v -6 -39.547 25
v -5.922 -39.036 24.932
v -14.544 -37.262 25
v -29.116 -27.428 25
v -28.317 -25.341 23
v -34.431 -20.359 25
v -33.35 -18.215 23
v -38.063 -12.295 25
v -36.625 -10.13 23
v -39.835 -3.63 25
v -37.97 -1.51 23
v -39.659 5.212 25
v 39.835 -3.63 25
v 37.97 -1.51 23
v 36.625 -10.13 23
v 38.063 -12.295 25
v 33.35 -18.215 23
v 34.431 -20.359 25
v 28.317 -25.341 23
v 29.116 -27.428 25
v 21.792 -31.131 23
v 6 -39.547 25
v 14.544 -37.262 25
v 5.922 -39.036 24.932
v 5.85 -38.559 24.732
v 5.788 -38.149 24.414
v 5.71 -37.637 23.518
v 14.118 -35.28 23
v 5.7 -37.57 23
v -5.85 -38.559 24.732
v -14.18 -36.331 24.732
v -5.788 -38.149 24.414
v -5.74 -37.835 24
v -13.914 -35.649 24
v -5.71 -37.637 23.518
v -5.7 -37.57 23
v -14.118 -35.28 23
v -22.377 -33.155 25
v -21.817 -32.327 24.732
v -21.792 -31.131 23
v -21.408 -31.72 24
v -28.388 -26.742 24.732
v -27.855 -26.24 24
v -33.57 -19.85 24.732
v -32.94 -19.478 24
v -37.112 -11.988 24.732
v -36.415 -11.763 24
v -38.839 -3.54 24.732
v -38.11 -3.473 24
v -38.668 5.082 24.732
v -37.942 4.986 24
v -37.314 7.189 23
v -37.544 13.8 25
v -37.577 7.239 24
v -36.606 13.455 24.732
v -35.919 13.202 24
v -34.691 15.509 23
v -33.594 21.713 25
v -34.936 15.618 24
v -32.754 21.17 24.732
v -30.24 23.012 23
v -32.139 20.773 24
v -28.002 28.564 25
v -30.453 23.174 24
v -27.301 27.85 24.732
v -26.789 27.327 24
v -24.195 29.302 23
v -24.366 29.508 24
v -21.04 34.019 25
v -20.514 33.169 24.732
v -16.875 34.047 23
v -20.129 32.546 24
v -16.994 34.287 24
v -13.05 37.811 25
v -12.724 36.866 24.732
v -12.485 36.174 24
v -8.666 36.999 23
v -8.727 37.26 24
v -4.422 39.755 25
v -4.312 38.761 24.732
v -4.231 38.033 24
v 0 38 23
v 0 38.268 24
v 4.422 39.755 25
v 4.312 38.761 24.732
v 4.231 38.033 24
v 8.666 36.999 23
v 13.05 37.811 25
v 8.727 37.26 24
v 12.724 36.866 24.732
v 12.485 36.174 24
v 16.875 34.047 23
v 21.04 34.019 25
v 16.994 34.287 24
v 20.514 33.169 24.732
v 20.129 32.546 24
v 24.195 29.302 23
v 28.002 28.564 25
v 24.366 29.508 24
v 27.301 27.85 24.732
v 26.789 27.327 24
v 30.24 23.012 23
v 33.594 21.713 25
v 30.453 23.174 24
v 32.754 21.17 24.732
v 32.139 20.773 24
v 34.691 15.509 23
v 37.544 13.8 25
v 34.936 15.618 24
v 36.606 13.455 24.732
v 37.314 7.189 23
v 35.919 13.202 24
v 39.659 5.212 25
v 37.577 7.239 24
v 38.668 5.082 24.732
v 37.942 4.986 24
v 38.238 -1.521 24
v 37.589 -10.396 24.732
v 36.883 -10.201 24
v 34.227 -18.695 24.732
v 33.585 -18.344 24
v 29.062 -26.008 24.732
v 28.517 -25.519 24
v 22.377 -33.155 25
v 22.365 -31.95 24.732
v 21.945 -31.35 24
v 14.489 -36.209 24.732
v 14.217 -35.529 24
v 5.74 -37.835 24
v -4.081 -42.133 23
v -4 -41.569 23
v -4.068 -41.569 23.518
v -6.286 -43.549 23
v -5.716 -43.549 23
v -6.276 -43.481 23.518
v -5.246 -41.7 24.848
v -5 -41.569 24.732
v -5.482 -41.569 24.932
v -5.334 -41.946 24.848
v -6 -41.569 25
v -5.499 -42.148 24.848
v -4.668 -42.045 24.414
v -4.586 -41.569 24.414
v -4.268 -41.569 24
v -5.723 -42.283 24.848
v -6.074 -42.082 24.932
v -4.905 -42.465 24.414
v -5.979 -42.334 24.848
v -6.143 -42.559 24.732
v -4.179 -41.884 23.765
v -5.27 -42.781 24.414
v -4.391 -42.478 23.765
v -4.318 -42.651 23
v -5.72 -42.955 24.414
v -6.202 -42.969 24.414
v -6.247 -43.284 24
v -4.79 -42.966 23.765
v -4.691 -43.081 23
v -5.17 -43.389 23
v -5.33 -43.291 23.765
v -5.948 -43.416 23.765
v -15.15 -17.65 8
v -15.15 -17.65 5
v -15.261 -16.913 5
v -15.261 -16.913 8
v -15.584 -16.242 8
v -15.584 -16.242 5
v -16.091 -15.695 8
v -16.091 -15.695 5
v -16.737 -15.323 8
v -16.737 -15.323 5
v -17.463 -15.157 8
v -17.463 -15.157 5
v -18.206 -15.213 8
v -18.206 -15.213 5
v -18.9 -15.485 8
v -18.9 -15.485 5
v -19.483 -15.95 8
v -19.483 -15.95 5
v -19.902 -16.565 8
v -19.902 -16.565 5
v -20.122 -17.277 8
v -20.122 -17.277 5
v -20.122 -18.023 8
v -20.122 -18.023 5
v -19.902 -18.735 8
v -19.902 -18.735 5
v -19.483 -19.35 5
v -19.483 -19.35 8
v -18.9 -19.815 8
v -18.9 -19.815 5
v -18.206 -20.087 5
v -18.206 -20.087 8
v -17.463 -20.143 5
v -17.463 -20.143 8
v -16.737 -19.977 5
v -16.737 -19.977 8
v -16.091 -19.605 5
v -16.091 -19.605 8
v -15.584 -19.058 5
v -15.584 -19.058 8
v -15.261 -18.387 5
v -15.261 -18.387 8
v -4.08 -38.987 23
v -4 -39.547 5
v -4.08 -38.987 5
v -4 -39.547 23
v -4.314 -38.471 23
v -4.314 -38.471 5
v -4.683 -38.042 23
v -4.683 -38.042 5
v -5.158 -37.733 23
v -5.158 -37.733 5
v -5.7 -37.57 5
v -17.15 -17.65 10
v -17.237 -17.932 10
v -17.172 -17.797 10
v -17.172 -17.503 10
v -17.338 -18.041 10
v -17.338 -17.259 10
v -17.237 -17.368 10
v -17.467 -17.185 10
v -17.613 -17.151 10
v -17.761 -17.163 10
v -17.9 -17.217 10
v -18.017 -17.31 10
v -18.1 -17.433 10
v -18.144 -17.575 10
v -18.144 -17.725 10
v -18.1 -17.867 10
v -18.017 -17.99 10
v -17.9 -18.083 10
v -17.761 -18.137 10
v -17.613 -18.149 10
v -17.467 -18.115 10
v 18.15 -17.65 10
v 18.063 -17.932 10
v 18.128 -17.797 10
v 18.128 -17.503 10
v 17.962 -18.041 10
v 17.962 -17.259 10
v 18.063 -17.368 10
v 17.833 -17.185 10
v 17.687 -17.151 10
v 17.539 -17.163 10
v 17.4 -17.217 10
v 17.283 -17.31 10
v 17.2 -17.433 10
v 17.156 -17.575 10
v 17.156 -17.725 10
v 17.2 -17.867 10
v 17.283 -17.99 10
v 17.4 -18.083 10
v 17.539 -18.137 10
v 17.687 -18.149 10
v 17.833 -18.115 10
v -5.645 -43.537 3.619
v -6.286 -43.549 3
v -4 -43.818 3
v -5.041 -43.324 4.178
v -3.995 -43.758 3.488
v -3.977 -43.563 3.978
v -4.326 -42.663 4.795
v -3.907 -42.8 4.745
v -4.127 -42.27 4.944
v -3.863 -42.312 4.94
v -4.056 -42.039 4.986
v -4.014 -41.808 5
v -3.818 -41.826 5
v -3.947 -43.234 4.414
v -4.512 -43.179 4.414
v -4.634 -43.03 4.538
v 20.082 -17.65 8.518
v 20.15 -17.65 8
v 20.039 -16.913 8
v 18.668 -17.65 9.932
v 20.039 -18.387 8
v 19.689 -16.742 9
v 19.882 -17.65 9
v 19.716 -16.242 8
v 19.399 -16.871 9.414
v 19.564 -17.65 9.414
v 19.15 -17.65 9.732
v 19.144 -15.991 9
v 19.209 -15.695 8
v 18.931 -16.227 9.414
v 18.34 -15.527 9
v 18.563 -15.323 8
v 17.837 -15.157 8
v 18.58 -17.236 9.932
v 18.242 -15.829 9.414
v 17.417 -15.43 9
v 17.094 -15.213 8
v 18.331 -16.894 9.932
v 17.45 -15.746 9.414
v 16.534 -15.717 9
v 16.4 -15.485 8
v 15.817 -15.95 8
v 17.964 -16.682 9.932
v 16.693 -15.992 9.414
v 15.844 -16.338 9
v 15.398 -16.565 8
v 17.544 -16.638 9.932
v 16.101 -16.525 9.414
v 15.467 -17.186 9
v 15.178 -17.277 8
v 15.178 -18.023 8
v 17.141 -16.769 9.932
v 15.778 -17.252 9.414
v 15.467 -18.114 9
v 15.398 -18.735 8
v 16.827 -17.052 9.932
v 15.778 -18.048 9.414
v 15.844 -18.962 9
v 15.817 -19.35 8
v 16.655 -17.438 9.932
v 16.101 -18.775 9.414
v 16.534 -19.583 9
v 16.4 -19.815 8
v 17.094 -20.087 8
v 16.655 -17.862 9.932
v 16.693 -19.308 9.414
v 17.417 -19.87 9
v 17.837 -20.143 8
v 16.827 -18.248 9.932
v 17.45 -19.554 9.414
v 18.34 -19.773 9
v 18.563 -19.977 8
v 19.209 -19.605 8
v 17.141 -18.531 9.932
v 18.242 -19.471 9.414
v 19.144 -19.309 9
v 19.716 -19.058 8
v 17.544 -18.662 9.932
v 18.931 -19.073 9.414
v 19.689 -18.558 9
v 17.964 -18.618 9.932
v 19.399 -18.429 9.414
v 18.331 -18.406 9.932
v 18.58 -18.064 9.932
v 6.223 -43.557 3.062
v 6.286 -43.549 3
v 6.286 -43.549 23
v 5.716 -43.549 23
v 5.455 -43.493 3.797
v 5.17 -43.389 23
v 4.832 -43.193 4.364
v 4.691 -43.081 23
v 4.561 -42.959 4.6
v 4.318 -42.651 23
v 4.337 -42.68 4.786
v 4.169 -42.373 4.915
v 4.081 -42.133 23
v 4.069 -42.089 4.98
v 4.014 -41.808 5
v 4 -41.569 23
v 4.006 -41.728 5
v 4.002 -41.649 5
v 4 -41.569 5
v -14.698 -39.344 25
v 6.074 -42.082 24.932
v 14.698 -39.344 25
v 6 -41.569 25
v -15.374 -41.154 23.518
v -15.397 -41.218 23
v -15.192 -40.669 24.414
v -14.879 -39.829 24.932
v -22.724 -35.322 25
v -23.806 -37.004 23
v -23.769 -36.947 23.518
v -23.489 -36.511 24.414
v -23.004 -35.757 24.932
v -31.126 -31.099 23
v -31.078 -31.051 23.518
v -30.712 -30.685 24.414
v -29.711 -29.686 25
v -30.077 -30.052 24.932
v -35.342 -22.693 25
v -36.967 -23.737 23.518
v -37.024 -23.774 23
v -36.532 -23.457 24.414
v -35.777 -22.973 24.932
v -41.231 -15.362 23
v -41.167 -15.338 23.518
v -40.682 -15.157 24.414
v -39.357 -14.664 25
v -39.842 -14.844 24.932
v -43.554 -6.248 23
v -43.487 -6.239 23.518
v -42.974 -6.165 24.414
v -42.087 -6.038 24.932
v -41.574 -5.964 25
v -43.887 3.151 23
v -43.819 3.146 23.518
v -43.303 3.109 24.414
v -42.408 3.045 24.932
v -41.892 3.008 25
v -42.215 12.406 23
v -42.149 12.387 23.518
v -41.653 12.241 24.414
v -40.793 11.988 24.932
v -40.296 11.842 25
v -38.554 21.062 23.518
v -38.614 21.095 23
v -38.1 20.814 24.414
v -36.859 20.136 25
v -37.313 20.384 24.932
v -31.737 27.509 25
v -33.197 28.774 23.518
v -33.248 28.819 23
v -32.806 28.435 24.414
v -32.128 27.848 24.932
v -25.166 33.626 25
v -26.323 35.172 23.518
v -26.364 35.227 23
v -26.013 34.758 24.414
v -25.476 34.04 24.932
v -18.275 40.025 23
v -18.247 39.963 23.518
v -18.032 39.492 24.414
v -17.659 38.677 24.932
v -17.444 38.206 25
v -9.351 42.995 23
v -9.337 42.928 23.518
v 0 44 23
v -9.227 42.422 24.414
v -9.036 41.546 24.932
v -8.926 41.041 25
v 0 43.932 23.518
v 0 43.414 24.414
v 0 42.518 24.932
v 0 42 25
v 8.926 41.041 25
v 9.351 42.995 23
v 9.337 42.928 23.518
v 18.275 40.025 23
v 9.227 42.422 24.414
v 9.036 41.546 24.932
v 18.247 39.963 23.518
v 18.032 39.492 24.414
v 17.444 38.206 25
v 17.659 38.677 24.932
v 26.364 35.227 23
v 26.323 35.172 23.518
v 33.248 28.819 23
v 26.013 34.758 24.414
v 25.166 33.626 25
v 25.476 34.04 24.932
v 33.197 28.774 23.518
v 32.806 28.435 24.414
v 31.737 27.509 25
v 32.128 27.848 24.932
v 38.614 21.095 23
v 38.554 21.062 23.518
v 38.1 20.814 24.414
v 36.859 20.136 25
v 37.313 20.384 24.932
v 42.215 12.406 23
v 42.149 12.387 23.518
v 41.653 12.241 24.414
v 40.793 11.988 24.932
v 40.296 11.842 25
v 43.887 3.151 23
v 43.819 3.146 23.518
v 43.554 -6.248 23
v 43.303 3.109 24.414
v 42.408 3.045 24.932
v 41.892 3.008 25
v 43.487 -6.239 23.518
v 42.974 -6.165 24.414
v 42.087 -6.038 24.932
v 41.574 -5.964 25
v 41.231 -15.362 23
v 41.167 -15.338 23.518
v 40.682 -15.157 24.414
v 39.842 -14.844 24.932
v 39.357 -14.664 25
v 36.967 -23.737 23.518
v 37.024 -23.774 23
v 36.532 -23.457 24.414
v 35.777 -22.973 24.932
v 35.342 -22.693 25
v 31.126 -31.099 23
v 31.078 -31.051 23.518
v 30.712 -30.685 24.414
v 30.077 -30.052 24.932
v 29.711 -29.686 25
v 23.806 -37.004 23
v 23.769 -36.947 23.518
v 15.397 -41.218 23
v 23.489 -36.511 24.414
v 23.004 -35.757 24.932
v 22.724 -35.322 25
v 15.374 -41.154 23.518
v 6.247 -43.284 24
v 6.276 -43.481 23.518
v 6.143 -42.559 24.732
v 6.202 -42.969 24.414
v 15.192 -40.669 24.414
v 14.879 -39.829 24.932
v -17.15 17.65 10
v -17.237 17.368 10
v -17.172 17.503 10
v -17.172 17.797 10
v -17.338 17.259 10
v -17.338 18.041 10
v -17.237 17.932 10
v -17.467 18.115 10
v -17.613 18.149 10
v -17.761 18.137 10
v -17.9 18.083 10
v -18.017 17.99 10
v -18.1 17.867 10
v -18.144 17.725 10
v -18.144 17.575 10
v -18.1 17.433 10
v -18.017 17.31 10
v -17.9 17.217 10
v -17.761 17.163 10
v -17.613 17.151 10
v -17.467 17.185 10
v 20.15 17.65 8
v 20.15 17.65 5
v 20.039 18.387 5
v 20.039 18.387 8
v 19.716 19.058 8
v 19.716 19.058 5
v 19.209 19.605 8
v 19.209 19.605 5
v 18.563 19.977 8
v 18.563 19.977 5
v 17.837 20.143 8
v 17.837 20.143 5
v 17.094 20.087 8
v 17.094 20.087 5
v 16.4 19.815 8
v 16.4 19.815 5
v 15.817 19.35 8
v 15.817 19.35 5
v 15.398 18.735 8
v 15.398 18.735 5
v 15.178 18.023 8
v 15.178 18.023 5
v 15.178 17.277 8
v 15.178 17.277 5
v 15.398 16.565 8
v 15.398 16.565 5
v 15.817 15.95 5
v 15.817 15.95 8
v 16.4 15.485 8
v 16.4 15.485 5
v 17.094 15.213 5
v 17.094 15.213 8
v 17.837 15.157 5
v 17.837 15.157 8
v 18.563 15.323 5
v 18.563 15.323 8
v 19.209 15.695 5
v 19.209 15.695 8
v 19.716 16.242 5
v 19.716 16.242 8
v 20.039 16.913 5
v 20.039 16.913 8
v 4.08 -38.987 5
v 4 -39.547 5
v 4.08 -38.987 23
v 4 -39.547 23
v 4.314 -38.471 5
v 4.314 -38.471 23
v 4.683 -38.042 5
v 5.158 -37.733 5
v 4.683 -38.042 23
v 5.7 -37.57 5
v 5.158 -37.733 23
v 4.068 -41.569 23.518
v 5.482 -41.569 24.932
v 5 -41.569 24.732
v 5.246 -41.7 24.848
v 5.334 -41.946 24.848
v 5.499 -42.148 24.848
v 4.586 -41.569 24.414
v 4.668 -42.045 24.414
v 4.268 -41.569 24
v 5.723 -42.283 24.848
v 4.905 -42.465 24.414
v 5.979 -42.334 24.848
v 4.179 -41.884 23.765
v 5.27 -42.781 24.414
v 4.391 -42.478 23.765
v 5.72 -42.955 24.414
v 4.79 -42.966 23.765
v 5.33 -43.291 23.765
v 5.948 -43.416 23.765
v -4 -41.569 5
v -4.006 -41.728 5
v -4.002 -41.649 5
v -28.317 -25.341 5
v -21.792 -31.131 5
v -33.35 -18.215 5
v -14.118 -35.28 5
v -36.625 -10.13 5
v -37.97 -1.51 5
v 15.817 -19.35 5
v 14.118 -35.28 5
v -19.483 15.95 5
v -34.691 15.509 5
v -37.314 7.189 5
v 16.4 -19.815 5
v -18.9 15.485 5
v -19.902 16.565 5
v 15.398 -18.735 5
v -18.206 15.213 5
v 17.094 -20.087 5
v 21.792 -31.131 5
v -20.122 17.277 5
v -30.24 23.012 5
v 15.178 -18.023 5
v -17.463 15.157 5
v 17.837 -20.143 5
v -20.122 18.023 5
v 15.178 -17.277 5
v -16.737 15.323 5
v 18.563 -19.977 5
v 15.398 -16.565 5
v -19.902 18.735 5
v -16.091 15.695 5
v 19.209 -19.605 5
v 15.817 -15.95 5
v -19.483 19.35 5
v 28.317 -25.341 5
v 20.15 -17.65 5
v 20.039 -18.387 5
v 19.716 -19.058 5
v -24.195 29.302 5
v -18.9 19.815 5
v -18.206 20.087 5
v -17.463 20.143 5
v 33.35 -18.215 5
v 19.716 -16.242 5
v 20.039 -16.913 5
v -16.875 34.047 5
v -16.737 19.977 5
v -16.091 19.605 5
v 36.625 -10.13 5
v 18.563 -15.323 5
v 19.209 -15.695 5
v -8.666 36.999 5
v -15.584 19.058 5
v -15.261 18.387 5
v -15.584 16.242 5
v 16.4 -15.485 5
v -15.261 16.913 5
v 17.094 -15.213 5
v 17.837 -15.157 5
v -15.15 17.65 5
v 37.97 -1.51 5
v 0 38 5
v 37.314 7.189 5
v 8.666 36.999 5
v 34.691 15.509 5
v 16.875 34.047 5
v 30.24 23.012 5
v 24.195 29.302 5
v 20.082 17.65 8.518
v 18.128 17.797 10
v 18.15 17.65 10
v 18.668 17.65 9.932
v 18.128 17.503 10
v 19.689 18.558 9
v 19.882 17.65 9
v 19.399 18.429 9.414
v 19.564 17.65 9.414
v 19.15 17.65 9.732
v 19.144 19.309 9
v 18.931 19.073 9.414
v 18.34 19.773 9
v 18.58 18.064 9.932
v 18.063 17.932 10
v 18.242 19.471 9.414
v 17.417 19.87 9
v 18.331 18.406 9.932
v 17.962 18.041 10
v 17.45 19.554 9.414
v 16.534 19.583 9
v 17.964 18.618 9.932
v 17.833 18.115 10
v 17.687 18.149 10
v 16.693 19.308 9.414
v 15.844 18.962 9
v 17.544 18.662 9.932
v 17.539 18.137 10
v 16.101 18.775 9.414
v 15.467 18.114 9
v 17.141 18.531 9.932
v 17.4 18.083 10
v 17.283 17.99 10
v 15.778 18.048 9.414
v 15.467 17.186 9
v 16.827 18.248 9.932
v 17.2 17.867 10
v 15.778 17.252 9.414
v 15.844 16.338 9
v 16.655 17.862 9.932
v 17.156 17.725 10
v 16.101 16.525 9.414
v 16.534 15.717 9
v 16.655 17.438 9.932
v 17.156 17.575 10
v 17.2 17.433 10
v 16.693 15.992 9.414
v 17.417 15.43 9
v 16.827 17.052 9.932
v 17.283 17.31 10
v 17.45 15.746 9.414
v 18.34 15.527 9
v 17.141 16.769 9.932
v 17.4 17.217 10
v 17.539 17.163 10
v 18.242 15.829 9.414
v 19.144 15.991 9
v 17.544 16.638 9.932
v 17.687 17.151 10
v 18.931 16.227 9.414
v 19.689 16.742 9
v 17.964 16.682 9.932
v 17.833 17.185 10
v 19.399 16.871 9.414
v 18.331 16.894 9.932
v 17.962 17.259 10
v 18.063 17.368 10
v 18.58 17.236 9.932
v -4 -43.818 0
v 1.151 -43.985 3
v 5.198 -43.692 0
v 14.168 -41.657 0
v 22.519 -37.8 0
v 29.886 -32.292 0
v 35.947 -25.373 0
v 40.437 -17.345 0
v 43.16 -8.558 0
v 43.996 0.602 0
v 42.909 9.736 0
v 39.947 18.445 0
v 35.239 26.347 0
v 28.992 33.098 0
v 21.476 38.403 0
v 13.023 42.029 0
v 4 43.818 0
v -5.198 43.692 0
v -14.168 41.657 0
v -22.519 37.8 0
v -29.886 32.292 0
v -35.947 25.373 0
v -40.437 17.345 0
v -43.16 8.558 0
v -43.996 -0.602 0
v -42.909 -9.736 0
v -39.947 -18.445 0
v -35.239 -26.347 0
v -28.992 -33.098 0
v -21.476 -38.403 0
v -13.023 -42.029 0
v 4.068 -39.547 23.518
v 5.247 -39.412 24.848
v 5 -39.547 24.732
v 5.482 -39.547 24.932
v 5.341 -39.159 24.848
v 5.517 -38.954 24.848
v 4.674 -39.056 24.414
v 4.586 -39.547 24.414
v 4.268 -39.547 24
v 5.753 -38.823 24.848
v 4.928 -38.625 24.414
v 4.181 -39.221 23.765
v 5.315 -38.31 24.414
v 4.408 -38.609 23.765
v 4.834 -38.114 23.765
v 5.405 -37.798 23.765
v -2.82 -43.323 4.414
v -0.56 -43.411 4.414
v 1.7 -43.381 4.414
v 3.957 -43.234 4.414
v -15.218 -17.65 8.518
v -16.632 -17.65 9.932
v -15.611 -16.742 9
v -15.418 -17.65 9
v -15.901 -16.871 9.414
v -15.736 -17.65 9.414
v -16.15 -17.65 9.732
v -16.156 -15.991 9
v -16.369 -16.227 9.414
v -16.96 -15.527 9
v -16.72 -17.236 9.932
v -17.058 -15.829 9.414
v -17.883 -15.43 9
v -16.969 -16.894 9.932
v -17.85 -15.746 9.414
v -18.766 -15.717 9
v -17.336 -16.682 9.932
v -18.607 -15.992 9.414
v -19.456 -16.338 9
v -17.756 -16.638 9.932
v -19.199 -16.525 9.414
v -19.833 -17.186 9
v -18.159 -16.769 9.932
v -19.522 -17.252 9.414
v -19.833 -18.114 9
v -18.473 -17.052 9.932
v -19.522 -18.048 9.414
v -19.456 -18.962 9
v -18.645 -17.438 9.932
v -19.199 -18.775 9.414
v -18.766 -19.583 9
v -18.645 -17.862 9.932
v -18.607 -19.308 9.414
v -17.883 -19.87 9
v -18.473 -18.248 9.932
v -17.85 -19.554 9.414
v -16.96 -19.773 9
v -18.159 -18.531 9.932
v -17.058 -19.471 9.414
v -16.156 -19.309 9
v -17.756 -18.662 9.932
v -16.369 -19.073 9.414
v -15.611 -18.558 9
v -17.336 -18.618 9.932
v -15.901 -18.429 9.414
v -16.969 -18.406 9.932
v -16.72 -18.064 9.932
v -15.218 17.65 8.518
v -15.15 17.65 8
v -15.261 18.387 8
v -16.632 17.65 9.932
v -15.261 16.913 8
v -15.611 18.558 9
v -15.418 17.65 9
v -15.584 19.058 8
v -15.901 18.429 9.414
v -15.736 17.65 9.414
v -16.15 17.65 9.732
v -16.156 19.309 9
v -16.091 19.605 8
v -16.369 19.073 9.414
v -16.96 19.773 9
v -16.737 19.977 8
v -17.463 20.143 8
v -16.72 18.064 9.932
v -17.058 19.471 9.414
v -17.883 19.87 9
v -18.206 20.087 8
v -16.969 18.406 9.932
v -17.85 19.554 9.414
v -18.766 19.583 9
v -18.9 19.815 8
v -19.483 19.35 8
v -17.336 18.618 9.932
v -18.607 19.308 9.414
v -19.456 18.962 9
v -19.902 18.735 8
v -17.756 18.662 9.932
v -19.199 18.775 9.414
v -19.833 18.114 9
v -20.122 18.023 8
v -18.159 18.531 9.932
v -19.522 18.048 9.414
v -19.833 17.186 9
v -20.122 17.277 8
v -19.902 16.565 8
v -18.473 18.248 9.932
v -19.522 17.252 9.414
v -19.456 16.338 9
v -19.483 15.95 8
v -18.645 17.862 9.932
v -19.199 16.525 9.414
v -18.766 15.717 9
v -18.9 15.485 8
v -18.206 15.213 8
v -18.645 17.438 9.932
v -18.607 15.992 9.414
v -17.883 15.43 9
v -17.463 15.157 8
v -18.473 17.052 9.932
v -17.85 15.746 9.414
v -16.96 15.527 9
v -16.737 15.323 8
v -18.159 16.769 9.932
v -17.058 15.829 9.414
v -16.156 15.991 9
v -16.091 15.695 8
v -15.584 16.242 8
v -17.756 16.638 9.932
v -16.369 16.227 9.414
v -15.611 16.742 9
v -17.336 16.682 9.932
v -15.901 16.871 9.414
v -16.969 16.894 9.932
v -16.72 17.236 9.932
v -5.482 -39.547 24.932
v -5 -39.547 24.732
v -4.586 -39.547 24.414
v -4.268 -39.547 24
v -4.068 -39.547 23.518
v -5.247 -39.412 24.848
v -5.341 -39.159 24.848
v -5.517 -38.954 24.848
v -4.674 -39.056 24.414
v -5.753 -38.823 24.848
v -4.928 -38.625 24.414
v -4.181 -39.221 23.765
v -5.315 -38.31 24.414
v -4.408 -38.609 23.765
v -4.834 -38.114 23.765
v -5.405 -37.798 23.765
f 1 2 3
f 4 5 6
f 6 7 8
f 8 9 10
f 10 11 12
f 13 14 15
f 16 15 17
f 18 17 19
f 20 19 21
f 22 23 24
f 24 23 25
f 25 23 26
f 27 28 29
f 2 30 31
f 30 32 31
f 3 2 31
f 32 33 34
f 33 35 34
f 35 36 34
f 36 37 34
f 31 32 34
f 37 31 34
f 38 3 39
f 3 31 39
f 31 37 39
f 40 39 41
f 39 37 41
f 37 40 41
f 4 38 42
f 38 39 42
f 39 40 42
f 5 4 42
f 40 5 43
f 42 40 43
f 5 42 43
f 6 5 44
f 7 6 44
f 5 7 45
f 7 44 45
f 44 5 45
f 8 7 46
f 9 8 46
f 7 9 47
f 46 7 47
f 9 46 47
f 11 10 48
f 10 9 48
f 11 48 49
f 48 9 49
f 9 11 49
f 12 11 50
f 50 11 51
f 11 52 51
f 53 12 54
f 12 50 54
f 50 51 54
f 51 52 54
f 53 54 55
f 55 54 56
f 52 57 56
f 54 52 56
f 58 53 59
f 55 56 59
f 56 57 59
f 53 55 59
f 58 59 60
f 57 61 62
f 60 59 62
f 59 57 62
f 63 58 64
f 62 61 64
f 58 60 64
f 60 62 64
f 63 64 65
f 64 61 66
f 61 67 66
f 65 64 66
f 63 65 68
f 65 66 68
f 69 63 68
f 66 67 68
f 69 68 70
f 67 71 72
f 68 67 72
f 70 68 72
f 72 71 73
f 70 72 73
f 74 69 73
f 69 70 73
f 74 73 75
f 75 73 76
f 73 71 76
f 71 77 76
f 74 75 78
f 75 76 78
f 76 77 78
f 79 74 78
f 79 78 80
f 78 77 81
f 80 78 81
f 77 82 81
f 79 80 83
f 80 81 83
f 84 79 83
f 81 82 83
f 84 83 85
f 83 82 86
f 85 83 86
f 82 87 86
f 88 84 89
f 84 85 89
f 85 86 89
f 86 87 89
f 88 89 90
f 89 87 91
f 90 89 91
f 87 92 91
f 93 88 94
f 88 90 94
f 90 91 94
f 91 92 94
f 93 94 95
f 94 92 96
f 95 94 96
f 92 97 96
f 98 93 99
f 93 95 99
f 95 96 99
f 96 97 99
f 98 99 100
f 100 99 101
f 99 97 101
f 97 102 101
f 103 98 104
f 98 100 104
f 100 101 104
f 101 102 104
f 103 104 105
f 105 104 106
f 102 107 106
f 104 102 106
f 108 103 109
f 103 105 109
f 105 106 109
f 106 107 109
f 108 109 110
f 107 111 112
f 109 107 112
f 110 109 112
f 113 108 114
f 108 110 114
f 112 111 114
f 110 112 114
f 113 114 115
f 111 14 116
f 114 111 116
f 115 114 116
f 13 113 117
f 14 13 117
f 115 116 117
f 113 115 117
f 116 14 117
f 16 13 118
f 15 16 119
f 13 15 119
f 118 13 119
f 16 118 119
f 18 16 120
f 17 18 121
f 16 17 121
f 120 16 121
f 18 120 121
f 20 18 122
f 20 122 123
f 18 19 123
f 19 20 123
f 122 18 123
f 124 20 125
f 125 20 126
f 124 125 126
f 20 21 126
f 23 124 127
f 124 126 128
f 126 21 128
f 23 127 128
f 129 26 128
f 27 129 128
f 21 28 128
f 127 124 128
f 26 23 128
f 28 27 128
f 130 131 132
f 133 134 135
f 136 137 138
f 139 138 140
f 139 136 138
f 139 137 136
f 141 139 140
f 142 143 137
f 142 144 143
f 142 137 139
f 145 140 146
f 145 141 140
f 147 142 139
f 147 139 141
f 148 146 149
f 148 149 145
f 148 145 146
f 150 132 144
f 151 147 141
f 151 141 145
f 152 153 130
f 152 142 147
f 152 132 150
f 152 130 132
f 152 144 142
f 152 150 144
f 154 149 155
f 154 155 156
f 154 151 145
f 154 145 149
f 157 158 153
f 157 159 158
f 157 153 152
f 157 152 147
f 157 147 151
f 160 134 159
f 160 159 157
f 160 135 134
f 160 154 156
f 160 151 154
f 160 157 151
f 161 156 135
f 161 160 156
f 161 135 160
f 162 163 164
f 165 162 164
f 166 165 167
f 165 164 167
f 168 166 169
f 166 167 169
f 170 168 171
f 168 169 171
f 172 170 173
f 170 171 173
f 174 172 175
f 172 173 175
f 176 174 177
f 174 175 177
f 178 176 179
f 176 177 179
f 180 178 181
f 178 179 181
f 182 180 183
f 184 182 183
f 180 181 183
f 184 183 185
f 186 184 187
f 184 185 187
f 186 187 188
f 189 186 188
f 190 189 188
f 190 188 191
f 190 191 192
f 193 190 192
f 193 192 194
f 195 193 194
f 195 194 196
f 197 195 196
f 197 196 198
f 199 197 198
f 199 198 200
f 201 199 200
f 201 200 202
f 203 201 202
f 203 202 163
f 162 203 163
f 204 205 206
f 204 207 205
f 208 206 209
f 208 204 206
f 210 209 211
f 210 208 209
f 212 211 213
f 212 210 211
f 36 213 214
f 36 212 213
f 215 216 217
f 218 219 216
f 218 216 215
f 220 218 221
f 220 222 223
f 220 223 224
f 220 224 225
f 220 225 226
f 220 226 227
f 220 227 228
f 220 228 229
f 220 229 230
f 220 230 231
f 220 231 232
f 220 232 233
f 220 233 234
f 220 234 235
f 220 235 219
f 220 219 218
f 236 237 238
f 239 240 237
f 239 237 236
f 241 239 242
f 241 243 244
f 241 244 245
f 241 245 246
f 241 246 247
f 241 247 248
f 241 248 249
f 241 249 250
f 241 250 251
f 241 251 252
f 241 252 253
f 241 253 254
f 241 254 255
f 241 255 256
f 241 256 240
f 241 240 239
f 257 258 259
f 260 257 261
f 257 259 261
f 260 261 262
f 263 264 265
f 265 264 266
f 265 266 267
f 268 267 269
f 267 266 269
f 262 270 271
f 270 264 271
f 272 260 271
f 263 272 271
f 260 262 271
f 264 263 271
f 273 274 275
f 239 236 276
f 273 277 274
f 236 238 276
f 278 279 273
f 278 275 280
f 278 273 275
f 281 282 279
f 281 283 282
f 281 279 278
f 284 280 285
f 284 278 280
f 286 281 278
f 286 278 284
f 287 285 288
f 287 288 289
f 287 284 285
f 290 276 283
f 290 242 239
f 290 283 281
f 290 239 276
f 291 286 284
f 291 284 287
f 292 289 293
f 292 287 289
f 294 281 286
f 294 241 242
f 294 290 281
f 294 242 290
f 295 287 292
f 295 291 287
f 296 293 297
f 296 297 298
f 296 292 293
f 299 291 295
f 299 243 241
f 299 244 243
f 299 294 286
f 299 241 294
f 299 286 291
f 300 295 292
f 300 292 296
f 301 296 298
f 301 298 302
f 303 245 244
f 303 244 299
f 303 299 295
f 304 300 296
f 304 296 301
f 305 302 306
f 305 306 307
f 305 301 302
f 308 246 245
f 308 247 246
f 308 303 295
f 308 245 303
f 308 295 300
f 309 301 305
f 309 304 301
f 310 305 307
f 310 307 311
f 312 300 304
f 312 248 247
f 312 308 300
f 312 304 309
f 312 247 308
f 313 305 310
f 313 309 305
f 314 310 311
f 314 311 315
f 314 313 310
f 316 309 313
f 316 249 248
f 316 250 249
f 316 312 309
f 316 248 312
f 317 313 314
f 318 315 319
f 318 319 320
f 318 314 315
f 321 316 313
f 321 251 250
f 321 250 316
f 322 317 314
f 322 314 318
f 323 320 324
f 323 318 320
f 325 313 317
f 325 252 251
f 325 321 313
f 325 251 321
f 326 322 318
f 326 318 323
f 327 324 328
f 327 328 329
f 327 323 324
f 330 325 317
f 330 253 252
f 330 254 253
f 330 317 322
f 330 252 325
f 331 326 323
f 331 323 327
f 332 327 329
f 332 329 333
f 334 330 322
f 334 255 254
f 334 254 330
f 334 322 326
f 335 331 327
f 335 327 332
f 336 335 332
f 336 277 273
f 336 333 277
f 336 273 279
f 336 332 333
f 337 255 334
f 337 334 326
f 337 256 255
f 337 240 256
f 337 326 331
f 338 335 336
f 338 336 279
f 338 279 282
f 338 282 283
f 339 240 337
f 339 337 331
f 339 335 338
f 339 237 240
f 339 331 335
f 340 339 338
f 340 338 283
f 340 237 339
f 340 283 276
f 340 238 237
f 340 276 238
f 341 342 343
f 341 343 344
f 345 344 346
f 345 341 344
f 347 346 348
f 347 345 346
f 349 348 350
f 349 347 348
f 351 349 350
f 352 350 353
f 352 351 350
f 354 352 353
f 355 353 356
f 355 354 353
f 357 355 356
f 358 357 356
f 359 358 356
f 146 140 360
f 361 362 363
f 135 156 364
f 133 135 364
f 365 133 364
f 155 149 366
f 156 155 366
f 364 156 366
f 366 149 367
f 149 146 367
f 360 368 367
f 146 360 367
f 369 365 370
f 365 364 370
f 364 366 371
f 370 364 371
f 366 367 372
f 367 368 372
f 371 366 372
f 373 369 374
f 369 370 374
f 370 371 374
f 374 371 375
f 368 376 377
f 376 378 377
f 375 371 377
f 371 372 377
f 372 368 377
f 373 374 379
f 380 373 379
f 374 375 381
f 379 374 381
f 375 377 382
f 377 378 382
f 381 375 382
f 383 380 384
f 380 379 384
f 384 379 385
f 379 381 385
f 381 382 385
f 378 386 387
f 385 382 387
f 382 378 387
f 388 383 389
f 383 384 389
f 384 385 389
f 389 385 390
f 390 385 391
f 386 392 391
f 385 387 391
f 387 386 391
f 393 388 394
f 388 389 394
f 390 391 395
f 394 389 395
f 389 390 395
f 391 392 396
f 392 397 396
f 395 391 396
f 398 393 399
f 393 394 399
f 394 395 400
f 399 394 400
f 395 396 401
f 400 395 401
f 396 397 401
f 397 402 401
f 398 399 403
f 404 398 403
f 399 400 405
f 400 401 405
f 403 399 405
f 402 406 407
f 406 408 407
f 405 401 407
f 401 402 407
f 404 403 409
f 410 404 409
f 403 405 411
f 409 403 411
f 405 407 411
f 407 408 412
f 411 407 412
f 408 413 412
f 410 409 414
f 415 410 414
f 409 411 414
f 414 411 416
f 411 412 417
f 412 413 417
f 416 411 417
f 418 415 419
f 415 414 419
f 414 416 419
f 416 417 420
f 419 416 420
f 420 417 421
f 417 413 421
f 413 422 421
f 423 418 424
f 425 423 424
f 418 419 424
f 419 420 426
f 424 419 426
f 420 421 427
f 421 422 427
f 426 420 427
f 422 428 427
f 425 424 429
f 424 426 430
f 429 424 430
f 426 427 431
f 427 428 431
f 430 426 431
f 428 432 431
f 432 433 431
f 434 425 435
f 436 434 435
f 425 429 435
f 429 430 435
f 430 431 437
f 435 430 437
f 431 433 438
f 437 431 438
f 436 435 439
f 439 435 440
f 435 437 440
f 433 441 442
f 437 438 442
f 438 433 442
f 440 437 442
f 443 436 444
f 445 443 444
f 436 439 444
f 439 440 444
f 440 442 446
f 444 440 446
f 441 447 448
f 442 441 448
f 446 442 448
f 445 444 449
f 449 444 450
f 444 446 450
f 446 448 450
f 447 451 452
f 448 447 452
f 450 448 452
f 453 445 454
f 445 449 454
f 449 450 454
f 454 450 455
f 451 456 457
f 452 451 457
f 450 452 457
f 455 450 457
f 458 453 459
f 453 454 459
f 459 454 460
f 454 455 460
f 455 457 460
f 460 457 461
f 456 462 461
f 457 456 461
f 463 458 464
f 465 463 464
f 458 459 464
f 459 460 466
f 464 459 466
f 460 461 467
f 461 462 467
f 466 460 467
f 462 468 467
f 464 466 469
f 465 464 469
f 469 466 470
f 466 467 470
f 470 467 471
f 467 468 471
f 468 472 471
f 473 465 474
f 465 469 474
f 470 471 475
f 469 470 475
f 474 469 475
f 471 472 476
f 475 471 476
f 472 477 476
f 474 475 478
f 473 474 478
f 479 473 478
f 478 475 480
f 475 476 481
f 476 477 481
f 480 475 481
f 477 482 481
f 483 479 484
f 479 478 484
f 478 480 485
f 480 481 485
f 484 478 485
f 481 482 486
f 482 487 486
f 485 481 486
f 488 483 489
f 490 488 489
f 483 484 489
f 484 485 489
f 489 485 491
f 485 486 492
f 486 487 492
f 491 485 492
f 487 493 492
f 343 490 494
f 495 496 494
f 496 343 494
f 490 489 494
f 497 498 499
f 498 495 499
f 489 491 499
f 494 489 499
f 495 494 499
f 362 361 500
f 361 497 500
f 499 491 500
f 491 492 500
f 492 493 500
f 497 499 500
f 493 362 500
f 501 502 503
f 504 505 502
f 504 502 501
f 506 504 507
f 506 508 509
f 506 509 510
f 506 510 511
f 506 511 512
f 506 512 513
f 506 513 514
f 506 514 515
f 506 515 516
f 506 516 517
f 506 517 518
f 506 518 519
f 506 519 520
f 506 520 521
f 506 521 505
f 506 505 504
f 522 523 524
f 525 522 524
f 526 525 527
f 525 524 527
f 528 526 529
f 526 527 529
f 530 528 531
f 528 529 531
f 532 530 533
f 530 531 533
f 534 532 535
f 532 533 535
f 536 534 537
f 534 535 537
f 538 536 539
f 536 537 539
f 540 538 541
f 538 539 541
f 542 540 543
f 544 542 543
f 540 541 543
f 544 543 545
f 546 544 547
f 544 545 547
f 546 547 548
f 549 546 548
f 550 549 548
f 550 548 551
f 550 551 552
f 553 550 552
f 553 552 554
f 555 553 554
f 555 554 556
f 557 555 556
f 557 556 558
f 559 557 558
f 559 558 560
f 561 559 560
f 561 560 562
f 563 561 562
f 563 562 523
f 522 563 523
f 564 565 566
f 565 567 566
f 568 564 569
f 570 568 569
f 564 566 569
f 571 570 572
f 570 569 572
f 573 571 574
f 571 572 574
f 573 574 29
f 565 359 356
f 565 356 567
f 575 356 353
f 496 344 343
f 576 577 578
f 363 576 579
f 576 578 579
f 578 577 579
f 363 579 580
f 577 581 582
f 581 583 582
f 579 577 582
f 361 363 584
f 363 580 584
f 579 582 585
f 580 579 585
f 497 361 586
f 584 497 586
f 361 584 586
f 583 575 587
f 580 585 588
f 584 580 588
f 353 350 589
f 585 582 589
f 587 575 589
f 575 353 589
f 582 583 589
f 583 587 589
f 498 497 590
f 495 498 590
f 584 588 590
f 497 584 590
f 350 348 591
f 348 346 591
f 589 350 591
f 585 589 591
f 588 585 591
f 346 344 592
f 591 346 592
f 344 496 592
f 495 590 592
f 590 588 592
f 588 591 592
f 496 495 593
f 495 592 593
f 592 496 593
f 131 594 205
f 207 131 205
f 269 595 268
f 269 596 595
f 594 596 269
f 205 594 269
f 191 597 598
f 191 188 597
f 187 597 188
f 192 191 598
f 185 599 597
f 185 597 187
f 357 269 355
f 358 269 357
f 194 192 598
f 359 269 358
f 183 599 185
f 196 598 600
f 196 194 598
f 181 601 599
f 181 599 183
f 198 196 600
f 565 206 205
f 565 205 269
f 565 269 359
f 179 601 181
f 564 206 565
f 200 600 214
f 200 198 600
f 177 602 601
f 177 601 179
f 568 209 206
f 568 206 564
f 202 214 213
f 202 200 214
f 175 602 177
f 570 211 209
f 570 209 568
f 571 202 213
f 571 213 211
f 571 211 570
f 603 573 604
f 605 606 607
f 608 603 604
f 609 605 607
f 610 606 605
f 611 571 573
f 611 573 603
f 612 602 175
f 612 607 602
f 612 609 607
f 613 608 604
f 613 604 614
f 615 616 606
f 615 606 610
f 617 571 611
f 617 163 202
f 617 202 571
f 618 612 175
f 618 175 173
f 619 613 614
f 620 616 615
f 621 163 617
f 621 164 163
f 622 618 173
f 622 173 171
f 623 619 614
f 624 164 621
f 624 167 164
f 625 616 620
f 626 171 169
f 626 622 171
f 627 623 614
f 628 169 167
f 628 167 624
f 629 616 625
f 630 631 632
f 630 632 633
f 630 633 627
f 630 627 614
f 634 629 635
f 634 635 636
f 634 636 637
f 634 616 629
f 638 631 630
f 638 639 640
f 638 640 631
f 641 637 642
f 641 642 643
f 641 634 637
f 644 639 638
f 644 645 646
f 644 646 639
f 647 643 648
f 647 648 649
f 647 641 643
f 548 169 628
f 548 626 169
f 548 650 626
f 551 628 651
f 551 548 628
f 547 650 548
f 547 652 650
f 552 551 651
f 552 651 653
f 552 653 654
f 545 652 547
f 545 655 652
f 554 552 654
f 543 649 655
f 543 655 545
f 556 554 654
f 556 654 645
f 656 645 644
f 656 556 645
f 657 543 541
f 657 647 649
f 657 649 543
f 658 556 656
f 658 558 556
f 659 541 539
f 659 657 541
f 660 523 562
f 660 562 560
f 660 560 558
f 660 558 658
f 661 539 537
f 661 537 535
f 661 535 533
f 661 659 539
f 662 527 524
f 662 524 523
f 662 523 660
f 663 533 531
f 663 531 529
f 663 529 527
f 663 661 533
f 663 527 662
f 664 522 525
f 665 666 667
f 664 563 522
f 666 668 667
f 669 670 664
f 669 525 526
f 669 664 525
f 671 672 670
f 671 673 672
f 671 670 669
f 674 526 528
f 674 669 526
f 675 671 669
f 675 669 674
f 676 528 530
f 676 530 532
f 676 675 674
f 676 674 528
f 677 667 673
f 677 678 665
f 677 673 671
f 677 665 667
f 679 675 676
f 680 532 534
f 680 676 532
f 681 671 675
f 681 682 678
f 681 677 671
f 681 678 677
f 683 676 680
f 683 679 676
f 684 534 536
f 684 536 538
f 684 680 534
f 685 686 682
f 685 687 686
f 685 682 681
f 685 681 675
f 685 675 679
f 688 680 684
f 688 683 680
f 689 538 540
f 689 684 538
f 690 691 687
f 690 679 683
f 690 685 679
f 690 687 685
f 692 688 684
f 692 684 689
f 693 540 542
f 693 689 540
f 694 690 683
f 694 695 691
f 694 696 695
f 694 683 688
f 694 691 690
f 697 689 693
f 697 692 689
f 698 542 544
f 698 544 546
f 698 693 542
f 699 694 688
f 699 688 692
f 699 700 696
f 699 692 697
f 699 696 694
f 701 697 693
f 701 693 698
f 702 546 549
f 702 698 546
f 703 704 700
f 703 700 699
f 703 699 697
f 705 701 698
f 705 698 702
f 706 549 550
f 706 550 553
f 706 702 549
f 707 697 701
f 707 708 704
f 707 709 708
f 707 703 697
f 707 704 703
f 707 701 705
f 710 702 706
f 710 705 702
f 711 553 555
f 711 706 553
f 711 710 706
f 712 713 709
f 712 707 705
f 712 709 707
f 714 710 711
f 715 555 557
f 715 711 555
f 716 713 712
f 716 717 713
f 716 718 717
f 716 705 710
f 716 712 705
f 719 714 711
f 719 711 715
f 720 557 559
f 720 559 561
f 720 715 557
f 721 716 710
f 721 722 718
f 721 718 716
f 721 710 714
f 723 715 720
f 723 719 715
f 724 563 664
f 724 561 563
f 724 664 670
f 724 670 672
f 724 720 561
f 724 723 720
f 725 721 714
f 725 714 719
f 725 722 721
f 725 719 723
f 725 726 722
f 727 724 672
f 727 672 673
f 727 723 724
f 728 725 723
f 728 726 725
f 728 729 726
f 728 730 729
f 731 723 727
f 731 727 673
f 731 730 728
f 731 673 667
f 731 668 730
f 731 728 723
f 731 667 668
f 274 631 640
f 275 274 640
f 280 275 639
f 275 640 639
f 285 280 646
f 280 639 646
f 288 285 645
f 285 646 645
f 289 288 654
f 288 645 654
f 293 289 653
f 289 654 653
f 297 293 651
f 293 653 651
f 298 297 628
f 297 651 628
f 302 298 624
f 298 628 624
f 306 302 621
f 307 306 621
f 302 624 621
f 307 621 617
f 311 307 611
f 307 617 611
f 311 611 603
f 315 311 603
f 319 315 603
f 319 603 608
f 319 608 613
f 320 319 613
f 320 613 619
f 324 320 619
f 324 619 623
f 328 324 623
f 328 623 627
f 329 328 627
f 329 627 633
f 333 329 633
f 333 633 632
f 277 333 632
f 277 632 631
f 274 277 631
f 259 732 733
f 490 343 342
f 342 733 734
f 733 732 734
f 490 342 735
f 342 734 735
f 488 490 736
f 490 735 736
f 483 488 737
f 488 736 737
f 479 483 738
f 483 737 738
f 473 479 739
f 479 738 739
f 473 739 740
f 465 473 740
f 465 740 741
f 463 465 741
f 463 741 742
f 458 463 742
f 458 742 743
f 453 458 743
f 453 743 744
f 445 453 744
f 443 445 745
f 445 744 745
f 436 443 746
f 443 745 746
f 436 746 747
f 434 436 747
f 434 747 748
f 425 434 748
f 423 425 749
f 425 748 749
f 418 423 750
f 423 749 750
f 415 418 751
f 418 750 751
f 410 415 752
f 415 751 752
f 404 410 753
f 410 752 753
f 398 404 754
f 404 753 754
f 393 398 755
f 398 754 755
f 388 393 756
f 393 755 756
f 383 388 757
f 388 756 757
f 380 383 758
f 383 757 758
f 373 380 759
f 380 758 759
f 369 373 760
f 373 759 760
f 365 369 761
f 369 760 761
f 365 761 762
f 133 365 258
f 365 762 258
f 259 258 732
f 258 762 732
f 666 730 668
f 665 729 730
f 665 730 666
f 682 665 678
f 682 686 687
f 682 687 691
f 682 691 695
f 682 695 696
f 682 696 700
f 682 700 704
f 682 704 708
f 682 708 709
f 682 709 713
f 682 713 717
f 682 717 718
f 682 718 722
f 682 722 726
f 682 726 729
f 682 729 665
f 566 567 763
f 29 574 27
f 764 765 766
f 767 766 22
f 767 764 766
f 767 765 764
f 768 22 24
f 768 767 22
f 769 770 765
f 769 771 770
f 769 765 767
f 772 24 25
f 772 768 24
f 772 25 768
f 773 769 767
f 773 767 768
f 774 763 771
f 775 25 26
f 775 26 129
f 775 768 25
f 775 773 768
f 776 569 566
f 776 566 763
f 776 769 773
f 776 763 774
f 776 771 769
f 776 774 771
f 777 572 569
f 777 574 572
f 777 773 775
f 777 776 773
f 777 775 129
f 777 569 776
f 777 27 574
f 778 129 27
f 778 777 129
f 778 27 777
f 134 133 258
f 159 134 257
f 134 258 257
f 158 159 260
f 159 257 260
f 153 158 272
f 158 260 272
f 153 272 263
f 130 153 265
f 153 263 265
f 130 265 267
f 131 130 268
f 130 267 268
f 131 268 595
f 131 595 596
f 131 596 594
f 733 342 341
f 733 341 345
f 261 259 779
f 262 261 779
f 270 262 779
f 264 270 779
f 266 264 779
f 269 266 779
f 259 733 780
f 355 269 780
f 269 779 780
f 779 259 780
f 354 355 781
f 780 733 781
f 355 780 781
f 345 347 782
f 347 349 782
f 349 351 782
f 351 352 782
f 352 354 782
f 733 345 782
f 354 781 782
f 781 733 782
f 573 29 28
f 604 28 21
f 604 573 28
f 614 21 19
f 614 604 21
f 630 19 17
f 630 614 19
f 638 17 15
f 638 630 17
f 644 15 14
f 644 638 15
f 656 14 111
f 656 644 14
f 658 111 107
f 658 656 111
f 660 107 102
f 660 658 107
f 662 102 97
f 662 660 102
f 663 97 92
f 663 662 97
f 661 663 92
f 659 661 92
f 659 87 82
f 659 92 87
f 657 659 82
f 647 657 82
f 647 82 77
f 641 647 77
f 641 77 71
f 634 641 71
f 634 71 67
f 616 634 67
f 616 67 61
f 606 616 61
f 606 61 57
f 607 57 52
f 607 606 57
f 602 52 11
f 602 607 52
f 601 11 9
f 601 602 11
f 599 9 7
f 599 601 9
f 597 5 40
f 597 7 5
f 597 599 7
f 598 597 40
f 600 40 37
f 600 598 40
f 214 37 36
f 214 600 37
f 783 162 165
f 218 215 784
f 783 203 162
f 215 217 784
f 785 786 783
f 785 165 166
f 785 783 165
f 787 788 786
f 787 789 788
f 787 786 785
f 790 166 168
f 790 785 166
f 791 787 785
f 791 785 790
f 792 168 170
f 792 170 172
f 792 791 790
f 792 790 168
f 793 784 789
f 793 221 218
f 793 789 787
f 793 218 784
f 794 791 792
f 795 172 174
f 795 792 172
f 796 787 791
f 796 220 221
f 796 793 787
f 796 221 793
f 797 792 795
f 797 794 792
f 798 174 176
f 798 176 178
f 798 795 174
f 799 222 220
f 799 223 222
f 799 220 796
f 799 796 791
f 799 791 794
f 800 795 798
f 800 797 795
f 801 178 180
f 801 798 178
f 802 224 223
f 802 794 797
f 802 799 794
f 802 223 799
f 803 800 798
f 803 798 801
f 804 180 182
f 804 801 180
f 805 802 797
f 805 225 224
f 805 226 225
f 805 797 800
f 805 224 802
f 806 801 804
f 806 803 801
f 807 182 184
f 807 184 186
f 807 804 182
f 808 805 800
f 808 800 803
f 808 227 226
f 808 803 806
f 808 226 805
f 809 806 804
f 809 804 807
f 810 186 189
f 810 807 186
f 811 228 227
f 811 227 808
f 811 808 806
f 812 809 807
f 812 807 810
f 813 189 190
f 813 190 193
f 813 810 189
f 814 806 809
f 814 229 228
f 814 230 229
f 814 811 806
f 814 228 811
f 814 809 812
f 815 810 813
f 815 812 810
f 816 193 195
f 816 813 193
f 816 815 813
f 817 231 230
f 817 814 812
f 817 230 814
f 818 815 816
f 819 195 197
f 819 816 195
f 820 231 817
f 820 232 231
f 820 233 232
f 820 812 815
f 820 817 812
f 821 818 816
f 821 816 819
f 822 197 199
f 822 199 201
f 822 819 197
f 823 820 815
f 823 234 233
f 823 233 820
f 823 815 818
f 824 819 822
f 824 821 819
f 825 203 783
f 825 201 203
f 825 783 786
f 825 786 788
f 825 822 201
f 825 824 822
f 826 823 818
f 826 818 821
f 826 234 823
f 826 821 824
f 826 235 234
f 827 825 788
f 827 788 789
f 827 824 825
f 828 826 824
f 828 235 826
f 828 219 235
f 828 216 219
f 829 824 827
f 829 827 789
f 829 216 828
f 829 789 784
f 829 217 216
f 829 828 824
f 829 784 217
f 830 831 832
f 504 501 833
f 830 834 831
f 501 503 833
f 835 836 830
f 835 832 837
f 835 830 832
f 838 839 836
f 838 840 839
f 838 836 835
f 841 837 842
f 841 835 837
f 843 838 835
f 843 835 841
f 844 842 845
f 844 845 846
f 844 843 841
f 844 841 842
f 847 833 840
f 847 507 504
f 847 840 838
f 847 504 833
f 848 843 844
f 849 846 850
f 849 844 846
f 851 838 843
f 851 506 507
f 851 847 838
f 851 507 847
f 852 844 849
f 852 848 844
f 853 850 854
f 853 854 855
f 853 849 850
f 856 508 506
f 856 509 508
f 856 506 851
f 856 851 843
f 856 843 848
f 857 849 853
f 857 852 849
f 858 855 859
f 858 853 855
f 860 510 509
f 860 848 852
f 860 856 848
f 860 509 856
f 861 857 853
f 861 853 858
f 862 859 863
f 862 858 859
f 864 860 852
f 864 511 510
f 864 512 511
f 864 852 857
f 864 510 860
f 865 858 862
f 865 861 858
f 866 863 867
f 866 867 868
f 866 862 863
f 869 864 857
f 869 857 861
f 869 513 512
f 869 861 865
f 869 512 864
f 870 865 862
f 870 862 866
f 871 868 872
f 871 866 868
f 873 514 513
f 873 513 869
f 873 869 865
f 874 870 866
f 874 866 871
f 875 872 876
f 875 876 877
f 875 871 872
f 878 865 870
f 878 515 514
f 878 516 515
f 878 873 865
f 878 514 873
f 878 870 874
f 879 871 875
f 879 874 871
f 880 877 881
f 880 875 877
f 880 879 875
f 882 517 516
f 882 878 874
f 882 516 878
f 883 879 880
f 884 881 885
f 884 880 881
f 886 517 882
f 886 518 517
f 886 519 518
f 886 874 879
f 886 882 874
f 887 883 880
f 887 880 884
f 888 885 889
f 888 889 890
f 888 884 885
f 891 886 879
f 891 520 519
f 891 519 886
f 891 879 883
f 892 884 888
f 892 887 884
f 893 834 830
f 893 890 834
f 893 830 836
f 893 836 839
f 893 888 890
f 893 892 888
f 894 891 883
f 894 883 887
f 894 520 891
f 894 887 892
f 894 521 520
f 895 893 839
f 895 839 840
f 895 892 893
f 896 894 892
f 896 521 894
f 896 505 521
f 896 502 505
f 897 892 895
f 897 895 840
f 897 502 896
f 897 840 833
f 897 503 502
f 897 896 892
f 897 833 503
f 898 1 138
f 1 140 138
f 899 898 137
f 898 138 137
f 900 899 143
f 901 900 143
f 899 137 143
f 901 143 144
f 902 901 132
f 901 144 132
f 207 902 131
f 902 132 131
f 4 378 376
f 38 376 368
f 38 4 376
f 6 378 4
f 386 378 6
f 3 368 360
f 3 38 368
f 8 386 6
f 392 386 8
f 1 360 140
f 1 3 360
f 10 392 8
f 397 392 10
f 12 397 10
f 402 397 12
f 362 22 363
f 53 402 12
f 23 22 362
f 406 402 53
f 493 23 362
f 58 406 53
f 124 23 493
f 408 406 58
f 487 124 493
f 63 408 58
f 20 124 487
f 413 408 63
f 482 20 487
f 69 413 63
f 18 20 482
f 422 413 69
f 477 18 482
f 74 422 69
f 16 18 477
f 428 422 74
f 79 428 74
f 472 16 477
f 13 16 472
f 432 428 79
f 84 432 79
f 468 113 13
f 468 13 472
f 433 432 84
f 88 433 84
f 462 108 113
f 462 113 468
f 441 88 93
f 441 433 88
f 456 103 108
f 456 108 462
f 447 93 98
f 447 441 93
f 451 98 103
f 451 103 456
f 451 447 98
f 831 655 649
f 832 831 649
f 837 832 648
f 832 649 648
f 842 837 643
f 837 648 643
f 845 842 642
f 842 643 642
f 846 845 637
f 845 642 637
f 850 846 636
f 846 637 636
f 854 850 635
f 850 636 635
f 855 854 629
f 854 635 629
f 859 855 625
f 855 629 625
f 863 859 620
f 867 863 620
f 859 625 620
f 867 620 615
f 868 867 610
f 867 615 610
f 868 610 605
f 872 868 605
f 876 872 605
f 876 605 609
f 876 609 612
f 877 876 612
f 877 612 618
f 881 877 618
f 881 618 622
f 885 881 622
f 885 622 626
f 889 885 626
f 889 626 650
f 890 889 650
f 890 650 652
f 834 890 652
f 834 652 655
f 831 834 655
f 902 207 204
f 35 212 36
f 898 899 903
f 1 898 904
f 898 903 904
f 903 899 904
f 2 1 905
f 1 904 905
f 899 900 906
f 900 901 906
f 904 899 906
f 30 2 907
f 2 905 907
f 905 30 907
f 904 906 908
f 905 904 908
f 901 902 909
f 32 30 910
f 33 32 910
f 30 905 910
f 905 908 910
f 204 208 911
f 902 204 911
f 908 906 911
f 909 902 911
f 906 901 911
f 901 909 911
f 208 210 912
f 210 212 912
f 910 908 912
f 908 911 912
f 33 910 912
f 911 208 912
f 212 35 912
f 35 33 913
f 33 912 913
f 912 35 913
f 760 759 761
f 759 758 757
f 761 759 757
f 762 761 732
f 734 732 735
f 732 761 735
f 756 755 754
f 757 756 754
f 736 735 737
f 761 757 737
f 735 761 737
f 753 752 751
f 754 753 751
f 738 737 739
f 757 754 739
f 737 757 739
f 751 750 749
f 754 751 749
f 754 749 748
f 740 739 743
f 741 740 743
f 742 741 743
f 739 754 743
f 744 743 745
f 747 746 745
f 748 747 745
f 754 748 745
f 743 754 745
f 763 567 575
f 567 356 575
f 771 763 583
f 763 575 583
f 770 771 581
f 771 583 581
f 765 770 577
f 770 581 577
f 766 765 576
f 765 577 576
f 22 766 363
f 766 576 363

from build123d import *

# Parameters (mm, degrees)
F0_R     = 44
F0_R_2   = 38
F1_DEPTH = 25
F2_W     = 8
F2_H     = 10
F3_DEPTH = 25.001
F5_R     = 44
F6_DEPTH = 5
F4_R     = 2.5
F7_DEPTH = 10
F8_R     = 2


with BuildPart() as f1:
    # F0 (on Top) → F1 (new body)
    with BuildSketch(Plane.XY):
        Circle(F0_R)
        Circle(F0_R_2, mode=Mode.SUBTRACT)
    extrude(amount=F1_DEPTH)

    # F2 (on Top) → F3 (cut, through all)
    with BuildSketch(Plane.XY):
        with Locations((0, -42.788887)):
            Rectangle(F2_W, F2_H)
    extrude(amount=F3_DEPTH, mode=Mode.SUBTRACT)

    # F5 (on Top) → F6 (join)
    with BuildSketch(Plane.XY):
        Circle(F5_R)
    extrude(amount=F6_DEPTH)

    # F4 (on Top) → F7 (join)
    with BuildSketch(Plane.XY):
        with Locations((17.65, -17.65)):
            Circle(F4_R)
        with Locations((17.65, 17.65)):
            Circle(F4_R)
        with Locations((-17.65, 17.65)):
            Circle(F4_R)
        with Locations((-17.65, -17.65)):
            Circle(F4_R)
    extrude(amount=F7_DEPTH)

    # F8
    f8_edges = [f1.edges().sort_by_distance(p)[0] for p in [
        (0, -44, 5),
        (4, -43.817805, 15),
        (-4, -43.817805, 15),
        (4, -37.788887, 15),
        (-4, -37.788887, 15),
        (15.15, -17.65, 10),
        (-20.15, -17.65, 10),
        (-20.15, 17.65, 10),
        (15.15, 17.65, 10),
        (-4, -40.803346, 25),
        (4, -40.803346, 25),
        (0, 38, 25),
        (0, 44, 25),
    ]]
    fillet(f8_edges, radius=F8_R)


solid = f1.part
